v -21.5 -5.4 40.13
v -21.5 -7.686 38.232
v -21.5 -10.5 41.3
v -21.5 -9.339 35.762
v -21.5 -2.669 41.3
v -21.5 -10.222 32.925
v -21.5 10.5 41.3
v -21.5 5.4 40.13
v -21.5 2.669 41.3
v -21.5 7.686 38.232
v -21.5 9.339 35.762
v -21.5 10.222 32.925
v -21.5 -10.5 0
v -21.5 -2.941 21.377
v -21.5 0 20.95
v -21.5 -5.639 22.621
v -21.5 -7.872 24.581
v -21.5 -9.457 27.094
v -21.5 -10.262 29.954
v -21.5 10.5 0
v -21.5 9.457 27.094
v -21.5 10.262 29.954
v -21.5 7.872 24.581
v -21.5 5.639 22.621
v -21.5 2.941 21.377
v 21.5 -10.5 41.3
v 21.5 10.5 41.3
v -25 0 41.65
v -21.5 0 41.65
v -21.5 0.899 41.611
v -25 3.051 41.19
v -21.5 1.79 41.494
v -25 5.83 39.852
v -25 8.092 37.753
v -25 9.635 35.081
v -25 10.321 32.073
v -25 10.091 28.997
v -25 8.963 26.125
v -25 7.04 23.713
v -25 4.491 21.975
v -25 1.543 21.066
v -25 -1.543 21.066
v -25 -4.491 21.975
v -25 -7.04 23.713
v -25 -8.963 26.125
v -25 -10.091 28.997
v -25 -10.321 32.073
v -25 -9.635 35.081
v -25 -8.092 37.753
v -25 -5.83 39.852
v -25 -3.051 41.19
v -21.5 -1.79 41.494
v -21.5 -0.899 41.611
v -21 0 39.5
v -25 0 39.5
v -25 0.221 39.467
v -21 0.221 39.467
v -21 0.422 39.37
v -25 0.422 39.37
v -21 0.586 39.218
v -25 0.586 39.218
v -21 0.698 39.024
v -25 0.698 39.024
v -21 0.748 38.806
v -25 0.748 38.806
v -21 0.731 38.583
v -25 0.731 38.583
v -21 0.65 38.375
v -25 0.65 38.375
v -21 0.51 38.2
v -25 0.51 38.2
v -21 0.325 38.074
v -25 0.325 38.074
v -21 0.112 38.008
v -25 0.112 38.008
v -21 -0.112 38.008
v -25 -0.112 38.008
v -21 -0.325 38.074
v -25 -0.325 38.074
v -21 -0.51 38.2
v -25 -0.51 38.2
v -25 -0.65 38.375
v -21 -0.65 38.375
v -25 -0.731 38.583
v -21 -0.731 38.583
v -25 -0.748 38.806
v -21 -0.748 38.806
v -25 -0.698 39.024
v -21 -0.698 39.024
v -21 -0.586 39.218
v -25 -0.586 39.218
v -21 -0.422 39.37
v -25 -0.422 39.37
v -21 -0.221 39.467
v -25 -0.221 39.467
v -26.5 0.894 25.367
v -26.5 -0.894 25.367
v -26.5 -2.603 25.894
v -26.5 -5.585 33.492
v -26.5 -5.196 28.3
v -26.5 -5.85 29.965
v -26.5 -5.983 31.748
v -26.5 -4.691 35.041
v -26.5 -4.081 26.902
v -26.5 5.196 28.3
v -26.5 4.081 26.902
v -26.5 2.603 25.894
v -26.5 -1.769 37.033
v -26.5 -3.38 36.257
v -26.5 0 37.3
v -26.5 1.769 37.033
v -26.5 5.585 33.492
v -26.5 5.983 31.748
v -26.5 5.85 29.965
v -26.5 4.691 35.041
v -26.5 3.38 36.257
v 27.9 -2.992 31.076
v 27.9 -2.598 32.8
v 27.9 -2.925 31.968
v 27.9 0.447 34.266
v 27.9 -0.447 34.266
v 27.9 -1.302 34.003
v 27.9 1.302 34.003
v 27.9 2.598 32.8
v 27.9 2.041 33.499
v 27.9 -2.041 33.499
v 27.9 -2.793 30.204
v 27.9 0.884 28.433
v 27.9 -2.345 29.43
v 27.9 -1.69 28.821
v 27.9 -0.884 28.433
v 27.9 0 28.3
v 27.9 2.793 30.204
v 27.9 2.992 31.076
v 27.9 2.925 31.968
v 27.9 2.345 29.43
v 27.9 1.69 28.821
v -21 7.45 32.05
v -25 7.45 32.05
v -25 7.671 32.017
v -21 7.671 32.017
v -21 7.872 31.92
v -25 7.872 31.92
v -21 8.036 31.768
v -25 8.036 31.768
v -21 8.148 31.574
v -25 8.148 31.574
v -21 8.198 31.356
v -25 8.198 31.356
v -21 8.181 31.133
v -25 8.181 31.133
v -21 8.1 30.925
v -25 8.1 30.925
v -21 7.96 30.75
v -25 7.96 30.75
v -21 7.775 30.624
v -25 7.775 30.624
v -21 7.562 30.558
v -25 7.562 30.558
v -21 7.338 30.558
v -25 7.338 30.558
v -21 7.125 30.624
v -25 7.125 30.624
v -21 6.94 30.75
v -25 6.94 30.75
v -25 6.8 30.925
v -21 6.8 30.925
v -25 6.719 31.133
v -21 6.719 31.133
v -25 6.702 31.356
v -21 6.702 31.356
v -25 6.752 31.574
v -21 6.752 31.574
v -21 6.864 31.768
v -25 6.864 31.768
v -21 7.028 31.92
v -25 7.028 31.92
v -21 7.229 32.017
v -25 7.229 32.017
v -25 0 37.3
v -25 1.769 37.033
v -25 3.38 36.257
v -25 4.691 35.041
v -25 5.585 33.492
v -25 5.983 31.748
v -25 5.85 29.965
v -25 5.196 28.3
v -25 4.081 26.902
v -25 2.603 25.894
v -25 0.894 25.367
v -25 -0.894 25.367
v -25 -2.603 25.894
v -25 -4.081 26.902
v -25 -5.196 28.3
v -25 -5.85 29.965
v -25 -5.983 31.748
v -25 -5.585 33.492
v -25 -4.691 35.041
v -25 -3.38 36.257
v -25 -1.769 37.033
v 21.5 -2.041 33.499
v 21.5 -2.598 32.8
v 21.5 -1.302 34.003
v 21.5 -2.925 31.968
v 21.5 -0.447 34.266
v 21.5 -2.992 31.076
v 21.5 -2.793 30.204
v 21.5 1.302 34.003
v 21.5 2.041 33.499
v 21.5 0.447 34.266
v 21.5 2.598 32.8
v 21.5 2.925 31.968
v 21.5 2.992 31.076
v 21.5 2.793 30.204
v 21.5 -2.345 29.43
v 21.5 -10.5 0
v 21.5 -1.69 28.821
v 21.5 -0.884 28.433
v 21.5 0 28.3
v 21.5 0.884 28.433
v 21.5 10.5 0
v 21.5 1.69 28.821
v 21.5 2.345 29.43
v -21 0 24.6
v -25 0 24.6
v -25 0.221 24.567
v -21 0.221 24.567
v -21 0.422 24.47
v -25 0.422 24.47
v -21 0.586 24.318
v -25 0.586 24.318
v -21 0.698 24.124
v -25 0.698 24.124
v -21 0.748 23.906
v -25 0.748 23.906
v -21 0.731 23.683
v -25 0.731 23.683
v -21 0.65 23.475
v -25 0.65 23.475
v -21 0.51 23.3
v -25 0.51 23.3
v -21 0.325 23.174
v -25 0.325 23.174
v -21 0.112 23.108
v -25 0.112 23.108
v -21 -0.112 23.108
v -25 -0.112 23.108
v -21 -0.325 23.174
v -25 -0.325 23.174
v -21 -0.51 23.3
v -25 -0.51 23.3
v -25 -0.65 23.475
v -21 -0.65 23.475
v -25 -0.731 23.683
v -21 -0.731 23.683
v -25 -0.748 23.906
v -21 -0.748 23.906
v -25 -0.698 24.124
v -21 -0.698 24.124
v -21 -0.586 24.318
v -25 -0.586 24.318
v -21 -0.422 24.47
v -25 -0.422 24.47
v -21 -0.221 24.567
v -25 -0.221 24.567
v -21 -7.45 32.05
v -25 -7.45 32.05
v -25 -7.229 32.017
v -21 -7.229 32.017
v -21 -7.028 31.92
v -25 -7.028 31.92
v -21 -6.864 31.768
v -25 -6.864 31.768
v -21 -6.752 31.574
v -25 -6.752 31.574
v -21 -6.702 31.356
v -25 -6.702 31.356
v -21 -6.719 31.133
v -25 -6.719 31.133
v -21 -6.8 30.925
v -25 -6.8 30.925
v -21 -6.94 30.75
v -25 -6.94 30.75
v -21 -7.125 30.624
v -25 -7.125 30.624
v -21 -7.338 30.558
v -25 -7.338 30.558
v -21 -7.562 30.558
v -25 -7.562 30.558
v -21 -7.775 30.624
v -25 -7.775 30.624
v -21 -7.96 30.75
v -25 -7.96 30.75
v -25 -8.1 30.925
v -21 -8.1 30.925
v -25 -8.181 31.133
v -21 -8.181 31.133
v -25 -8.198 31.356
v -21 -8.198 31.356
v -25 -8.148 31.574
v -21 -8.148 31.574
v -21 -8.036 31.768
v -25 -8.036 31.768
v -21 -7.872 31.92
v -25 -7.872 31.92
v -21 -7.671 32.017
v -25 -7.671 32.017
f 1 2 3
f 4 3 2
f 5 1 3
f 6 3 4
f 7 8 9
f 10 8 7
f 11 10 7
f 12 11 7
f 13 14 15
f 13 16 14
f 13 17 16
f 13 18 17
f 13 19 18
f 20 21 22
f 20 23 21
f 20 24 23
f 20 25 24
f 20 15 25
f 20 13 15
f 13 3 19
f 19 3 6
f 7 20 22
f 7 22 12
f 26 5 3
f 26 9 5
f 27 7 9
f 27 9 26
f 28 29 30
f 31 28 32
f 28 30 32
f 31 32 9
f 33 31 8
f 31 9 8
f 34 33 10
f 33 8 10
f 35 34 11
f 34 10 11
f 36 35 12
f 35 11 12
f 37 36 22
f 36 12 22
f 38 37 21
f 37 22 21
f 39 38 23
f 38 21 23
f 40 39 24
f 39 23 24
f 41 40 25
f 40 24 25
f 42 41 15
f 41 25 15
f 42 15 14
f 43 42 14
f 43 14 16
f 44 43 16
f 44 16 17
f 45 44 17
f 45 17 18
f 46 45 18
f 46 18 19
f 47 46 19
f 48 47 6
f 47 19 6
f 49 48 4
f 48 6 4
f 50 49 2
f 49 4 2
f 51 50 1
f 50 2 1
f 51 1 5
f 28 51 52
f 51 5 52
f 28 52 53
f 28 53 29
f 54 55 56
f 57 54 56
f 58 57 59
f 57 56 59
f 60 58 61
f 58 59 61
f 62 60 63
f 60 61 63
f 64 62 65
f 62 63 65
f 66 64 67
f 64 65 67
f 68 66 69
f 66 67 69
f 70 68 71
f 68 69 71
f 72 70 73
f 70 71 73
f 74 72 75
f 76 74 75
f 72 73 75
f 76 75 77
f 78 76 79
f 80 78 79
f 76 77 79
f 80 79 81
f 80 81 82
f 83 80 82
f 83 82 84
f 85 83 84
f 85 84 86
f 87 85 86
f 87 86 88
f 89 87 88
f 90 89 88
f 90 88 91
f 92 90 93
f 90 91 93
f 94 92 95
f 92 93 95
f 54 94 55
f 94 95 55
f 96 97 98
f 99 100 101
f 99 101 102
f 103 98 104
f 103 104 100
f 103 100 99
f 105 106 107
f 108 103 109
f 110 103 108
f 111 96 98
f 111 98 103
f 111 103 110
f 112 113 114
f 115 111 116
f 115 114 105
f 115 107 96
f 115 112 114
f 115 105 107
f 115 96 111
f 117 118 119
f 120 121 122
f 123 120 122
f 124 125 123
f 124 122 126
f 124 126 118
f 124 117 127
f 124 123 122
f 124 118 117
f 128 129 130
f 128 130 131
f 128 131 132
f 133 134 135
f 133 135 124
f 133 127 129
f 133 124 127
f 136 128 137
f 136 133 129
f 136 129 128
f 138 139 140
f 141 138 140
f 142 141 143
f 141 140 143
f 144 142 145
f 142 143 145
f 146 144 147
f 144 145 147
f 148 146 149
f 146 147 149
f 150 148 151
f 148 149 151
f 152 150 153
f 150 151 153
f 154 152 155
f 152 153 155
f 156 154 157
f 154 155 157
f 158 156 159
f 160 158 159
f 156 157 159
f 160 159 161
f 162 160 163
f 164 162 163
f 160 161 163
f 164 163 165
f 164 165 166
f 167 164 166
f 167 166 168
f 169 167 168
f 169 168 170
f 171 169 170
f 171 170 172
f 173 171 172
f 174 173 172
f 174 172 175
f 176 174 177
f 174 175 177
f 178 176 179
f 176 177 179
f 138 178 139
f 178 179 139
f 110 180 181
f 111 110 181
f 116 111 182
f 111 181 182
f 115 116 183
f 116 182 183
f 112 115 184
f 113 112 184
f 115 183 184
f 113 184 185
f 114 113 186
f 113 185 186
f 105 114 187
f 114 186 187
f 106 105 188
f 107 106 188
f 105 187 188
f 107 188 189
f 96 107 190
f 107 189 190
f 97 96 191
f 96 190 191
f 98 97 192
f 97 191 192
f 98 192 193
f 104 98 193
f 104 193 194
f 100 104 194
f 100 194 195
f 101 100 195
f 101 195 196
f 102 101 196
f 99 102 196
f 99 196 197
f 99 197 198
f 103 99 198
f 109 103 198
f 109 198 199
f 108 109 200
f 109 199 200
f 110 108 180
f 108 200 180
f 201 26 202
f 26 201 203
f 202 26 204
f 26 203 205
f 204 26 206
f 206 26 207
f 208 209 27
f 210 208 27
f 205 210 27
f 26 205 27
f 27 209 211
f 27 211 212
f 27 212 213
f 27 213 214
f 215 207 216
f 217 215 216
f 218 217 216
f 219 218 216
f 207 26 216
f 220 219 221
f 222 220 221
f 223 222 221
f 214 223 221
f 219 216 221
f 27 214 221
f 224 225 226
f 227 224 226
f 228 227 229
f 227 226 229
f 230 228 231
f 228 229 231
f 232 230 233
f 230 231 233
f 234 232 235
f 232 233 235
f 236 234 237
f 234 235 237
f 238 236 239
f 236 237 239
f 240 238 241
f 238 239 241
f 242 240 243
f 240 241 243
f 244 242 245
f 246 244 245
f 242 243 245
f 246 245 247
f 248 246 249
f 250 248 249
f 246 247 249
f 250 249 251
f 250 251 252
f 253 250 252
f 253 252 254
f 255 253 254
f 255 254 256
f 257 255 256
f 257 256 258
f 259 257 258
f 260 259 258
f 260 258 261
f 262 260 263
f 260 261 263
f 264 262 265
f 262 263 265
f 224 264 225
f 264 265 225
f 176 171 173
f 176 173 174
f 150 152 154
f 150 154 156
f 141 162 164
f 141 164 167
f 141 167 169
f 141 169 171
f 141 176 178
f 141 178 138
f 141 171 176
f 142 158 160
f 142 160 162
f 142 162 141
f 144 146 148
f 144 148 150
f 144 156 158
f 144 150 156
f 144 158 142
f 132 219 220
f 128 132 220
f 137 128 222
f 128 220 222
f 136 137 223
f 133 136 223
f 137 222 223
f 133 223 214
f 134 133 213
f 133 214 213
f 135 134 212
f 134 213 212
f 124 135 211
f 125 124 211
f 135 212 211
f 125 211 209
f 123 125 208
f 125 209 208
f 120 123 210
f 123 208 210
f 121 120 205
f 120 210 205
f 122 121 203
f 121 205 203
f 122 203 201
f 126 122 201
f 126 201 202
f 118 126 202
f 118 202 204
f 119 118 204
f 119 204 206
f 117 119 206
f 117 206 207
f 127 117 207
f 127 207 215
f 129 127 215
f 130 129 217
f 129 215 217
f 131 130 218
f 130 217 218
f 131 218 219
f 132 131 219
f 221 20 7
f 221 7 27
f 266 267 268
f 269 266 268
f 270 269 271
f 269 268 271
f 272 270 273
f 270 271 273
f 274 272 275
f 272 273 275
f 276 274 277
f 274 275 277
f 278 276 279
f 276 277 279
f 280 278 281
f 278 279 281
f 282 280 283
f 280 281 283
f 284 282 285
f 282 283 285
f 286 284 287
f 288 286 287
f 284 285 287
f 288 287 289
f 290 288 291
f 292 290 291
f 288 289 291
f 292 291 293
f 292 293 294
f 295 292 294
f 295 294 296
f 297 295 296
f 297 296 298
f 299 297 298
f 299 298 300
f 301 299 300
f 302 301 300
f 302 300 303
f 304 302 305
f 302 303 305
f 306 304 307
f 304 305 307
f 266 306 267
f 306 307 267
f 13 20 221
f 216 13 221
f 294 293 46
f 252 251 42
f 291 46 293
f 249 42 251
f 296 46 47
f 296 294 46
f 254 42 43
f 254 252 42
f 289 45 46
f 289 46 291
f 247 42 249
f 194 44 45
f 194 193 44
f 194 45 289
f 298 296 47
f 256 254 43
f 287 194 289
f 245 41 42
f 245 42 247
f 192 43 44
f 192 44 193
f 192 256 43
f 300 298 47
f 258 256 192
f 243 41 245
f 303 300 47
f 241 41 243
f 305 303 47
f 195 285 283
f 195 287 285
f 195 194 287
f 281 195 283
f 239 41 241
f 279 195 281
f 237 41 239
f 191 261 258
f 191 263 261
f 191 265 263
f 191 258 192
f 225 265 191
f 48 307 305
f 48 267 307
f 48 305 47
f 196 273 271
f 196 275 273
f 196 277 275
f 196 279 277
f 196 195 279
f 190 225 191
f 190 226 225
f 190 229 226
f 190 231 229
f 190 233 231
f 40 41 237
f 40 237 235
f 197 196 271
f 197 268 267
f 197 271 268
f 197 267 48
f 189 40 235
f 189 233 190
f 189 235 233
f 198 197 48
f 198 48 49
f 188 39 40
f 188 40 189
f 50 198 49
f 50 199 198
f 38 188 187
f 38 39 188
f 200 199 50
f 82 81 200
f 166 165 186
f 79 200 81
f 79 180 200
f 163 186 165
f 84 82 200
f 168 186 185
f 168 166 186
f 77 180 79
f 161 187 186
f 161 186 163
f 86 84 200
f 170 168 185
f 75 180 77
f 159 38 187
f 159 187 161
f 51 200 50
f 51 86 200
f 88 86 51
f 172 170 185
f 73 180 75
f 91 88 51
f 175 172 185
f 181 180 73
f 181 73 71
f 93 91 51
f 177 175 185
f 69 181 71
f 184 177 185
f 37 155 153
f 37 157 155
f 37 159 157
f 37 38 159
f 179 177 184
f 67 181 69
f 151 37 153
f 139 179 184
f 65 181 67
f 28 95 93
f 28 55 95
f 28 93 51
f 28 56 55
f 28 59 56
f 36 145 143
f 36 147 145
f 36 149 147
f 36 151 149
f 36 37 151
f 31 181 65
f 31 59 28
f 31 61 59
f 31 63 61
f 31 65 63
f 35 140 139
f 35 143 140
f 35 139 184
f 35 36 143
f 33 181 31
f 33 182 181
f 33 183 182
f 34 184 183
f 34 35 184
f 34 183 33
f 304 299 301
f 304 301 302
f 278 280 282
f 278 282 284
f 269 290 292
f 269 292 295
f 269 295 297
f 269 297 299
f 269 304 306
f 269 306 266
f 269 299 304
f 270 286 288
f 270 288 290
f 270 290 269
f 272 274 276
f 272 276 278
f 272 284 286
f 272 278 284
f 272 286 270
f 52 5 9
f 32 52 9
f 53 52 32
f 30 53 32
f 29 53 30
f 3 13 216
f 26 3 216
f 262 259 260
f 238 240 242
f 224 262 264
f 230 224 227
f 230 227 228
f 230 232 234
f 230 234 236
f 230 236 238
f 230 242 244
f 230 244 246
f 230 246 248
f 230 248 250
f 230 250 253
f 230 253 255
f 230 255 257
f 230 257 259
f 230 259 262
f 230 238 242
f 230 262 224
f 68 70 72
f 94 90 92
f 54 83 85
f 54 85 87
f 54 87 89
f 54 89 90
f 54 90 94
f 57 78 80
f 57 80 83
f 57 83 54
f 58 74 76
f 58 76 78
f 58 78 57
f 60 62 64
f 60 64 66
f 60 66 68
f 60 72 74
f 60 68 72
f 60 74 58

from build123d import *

# Parameters (mm, degrees)
SKETCH_1_W          = 43
SKETCH_1_H          = 21
EXTRUDE_1_DEPTH     = 41.3
SKETCH_2_R          = 3
EXTRUDE_2_DEPTH     = 6.4
SKETCH_3_R          = 10.35
EXTRUDE_3_DEPTH     = 3.5
SKETCH_4_R          = 6
EXTRUDE_4_DEPTH     = 1.5
SKETCH_5_R          = 0.75
CUT_EXTRUDE_1_DEPTH = 4


with BuildPart() as part:
    # 草图1 → 凸台-拉伸1 (new body)
    with BuildSketch(Plane.XY):
        Rectangle(SKETCH_1_W, SKETCH_1_H)
    extrude(amount=EXTRUDE_1_DEPTH)

    # 草图2 → 凸台-拉伸2 (add)
    with BuildSketch(Plane(origin=(21.5, 0, 0), x_dir=(0, 0, -1), z_dir=(1, 0, 0))):
        with Locations((-31.3, 0)):
            Circle(SKETCH_2_R)
    extrude(amount=EXTRUDE_2_DEPTH)

    # 草图3 → 凸台-拉伸3 (add)
    with BuildSketch(Plane.ZY.offset(21.5)):
        with Locations((31.3, 0)):
            Circle(SKETCH_3_R)
    extrude(amount=EXTRUDE_3_DEPTH)

    # 草图4 → 凸台-拉伸4 (add)
    with BuildSketch(Plane.ZY.offset(25)):
        with Locations((31.3, 0)):
            Circle(SKETCH_4_R)
    extrude(amount=EXTRUDE_4_DEPTH)

    # 草图5 → 切除-拉伸1 (cut)
    with BuildSketch(Plane.ZY.offset(25)):
        with Locations((38.75, 0)):
            Circle(SKETCH_5_R)
        with Locations((31.3, -7.45)):
            Circle(SKETCH_5_R)
        with Locations((23.85, 0)):
            Circle(SKETCH_5_R)
        with Locations((31.3, 7.45)):
            Circle(SKETCH_5_R)
    extrude(amount=-CUT_EXTRUDE_1_DEPTH, mode=Mode.SUBTRACT)


solid = part.part
